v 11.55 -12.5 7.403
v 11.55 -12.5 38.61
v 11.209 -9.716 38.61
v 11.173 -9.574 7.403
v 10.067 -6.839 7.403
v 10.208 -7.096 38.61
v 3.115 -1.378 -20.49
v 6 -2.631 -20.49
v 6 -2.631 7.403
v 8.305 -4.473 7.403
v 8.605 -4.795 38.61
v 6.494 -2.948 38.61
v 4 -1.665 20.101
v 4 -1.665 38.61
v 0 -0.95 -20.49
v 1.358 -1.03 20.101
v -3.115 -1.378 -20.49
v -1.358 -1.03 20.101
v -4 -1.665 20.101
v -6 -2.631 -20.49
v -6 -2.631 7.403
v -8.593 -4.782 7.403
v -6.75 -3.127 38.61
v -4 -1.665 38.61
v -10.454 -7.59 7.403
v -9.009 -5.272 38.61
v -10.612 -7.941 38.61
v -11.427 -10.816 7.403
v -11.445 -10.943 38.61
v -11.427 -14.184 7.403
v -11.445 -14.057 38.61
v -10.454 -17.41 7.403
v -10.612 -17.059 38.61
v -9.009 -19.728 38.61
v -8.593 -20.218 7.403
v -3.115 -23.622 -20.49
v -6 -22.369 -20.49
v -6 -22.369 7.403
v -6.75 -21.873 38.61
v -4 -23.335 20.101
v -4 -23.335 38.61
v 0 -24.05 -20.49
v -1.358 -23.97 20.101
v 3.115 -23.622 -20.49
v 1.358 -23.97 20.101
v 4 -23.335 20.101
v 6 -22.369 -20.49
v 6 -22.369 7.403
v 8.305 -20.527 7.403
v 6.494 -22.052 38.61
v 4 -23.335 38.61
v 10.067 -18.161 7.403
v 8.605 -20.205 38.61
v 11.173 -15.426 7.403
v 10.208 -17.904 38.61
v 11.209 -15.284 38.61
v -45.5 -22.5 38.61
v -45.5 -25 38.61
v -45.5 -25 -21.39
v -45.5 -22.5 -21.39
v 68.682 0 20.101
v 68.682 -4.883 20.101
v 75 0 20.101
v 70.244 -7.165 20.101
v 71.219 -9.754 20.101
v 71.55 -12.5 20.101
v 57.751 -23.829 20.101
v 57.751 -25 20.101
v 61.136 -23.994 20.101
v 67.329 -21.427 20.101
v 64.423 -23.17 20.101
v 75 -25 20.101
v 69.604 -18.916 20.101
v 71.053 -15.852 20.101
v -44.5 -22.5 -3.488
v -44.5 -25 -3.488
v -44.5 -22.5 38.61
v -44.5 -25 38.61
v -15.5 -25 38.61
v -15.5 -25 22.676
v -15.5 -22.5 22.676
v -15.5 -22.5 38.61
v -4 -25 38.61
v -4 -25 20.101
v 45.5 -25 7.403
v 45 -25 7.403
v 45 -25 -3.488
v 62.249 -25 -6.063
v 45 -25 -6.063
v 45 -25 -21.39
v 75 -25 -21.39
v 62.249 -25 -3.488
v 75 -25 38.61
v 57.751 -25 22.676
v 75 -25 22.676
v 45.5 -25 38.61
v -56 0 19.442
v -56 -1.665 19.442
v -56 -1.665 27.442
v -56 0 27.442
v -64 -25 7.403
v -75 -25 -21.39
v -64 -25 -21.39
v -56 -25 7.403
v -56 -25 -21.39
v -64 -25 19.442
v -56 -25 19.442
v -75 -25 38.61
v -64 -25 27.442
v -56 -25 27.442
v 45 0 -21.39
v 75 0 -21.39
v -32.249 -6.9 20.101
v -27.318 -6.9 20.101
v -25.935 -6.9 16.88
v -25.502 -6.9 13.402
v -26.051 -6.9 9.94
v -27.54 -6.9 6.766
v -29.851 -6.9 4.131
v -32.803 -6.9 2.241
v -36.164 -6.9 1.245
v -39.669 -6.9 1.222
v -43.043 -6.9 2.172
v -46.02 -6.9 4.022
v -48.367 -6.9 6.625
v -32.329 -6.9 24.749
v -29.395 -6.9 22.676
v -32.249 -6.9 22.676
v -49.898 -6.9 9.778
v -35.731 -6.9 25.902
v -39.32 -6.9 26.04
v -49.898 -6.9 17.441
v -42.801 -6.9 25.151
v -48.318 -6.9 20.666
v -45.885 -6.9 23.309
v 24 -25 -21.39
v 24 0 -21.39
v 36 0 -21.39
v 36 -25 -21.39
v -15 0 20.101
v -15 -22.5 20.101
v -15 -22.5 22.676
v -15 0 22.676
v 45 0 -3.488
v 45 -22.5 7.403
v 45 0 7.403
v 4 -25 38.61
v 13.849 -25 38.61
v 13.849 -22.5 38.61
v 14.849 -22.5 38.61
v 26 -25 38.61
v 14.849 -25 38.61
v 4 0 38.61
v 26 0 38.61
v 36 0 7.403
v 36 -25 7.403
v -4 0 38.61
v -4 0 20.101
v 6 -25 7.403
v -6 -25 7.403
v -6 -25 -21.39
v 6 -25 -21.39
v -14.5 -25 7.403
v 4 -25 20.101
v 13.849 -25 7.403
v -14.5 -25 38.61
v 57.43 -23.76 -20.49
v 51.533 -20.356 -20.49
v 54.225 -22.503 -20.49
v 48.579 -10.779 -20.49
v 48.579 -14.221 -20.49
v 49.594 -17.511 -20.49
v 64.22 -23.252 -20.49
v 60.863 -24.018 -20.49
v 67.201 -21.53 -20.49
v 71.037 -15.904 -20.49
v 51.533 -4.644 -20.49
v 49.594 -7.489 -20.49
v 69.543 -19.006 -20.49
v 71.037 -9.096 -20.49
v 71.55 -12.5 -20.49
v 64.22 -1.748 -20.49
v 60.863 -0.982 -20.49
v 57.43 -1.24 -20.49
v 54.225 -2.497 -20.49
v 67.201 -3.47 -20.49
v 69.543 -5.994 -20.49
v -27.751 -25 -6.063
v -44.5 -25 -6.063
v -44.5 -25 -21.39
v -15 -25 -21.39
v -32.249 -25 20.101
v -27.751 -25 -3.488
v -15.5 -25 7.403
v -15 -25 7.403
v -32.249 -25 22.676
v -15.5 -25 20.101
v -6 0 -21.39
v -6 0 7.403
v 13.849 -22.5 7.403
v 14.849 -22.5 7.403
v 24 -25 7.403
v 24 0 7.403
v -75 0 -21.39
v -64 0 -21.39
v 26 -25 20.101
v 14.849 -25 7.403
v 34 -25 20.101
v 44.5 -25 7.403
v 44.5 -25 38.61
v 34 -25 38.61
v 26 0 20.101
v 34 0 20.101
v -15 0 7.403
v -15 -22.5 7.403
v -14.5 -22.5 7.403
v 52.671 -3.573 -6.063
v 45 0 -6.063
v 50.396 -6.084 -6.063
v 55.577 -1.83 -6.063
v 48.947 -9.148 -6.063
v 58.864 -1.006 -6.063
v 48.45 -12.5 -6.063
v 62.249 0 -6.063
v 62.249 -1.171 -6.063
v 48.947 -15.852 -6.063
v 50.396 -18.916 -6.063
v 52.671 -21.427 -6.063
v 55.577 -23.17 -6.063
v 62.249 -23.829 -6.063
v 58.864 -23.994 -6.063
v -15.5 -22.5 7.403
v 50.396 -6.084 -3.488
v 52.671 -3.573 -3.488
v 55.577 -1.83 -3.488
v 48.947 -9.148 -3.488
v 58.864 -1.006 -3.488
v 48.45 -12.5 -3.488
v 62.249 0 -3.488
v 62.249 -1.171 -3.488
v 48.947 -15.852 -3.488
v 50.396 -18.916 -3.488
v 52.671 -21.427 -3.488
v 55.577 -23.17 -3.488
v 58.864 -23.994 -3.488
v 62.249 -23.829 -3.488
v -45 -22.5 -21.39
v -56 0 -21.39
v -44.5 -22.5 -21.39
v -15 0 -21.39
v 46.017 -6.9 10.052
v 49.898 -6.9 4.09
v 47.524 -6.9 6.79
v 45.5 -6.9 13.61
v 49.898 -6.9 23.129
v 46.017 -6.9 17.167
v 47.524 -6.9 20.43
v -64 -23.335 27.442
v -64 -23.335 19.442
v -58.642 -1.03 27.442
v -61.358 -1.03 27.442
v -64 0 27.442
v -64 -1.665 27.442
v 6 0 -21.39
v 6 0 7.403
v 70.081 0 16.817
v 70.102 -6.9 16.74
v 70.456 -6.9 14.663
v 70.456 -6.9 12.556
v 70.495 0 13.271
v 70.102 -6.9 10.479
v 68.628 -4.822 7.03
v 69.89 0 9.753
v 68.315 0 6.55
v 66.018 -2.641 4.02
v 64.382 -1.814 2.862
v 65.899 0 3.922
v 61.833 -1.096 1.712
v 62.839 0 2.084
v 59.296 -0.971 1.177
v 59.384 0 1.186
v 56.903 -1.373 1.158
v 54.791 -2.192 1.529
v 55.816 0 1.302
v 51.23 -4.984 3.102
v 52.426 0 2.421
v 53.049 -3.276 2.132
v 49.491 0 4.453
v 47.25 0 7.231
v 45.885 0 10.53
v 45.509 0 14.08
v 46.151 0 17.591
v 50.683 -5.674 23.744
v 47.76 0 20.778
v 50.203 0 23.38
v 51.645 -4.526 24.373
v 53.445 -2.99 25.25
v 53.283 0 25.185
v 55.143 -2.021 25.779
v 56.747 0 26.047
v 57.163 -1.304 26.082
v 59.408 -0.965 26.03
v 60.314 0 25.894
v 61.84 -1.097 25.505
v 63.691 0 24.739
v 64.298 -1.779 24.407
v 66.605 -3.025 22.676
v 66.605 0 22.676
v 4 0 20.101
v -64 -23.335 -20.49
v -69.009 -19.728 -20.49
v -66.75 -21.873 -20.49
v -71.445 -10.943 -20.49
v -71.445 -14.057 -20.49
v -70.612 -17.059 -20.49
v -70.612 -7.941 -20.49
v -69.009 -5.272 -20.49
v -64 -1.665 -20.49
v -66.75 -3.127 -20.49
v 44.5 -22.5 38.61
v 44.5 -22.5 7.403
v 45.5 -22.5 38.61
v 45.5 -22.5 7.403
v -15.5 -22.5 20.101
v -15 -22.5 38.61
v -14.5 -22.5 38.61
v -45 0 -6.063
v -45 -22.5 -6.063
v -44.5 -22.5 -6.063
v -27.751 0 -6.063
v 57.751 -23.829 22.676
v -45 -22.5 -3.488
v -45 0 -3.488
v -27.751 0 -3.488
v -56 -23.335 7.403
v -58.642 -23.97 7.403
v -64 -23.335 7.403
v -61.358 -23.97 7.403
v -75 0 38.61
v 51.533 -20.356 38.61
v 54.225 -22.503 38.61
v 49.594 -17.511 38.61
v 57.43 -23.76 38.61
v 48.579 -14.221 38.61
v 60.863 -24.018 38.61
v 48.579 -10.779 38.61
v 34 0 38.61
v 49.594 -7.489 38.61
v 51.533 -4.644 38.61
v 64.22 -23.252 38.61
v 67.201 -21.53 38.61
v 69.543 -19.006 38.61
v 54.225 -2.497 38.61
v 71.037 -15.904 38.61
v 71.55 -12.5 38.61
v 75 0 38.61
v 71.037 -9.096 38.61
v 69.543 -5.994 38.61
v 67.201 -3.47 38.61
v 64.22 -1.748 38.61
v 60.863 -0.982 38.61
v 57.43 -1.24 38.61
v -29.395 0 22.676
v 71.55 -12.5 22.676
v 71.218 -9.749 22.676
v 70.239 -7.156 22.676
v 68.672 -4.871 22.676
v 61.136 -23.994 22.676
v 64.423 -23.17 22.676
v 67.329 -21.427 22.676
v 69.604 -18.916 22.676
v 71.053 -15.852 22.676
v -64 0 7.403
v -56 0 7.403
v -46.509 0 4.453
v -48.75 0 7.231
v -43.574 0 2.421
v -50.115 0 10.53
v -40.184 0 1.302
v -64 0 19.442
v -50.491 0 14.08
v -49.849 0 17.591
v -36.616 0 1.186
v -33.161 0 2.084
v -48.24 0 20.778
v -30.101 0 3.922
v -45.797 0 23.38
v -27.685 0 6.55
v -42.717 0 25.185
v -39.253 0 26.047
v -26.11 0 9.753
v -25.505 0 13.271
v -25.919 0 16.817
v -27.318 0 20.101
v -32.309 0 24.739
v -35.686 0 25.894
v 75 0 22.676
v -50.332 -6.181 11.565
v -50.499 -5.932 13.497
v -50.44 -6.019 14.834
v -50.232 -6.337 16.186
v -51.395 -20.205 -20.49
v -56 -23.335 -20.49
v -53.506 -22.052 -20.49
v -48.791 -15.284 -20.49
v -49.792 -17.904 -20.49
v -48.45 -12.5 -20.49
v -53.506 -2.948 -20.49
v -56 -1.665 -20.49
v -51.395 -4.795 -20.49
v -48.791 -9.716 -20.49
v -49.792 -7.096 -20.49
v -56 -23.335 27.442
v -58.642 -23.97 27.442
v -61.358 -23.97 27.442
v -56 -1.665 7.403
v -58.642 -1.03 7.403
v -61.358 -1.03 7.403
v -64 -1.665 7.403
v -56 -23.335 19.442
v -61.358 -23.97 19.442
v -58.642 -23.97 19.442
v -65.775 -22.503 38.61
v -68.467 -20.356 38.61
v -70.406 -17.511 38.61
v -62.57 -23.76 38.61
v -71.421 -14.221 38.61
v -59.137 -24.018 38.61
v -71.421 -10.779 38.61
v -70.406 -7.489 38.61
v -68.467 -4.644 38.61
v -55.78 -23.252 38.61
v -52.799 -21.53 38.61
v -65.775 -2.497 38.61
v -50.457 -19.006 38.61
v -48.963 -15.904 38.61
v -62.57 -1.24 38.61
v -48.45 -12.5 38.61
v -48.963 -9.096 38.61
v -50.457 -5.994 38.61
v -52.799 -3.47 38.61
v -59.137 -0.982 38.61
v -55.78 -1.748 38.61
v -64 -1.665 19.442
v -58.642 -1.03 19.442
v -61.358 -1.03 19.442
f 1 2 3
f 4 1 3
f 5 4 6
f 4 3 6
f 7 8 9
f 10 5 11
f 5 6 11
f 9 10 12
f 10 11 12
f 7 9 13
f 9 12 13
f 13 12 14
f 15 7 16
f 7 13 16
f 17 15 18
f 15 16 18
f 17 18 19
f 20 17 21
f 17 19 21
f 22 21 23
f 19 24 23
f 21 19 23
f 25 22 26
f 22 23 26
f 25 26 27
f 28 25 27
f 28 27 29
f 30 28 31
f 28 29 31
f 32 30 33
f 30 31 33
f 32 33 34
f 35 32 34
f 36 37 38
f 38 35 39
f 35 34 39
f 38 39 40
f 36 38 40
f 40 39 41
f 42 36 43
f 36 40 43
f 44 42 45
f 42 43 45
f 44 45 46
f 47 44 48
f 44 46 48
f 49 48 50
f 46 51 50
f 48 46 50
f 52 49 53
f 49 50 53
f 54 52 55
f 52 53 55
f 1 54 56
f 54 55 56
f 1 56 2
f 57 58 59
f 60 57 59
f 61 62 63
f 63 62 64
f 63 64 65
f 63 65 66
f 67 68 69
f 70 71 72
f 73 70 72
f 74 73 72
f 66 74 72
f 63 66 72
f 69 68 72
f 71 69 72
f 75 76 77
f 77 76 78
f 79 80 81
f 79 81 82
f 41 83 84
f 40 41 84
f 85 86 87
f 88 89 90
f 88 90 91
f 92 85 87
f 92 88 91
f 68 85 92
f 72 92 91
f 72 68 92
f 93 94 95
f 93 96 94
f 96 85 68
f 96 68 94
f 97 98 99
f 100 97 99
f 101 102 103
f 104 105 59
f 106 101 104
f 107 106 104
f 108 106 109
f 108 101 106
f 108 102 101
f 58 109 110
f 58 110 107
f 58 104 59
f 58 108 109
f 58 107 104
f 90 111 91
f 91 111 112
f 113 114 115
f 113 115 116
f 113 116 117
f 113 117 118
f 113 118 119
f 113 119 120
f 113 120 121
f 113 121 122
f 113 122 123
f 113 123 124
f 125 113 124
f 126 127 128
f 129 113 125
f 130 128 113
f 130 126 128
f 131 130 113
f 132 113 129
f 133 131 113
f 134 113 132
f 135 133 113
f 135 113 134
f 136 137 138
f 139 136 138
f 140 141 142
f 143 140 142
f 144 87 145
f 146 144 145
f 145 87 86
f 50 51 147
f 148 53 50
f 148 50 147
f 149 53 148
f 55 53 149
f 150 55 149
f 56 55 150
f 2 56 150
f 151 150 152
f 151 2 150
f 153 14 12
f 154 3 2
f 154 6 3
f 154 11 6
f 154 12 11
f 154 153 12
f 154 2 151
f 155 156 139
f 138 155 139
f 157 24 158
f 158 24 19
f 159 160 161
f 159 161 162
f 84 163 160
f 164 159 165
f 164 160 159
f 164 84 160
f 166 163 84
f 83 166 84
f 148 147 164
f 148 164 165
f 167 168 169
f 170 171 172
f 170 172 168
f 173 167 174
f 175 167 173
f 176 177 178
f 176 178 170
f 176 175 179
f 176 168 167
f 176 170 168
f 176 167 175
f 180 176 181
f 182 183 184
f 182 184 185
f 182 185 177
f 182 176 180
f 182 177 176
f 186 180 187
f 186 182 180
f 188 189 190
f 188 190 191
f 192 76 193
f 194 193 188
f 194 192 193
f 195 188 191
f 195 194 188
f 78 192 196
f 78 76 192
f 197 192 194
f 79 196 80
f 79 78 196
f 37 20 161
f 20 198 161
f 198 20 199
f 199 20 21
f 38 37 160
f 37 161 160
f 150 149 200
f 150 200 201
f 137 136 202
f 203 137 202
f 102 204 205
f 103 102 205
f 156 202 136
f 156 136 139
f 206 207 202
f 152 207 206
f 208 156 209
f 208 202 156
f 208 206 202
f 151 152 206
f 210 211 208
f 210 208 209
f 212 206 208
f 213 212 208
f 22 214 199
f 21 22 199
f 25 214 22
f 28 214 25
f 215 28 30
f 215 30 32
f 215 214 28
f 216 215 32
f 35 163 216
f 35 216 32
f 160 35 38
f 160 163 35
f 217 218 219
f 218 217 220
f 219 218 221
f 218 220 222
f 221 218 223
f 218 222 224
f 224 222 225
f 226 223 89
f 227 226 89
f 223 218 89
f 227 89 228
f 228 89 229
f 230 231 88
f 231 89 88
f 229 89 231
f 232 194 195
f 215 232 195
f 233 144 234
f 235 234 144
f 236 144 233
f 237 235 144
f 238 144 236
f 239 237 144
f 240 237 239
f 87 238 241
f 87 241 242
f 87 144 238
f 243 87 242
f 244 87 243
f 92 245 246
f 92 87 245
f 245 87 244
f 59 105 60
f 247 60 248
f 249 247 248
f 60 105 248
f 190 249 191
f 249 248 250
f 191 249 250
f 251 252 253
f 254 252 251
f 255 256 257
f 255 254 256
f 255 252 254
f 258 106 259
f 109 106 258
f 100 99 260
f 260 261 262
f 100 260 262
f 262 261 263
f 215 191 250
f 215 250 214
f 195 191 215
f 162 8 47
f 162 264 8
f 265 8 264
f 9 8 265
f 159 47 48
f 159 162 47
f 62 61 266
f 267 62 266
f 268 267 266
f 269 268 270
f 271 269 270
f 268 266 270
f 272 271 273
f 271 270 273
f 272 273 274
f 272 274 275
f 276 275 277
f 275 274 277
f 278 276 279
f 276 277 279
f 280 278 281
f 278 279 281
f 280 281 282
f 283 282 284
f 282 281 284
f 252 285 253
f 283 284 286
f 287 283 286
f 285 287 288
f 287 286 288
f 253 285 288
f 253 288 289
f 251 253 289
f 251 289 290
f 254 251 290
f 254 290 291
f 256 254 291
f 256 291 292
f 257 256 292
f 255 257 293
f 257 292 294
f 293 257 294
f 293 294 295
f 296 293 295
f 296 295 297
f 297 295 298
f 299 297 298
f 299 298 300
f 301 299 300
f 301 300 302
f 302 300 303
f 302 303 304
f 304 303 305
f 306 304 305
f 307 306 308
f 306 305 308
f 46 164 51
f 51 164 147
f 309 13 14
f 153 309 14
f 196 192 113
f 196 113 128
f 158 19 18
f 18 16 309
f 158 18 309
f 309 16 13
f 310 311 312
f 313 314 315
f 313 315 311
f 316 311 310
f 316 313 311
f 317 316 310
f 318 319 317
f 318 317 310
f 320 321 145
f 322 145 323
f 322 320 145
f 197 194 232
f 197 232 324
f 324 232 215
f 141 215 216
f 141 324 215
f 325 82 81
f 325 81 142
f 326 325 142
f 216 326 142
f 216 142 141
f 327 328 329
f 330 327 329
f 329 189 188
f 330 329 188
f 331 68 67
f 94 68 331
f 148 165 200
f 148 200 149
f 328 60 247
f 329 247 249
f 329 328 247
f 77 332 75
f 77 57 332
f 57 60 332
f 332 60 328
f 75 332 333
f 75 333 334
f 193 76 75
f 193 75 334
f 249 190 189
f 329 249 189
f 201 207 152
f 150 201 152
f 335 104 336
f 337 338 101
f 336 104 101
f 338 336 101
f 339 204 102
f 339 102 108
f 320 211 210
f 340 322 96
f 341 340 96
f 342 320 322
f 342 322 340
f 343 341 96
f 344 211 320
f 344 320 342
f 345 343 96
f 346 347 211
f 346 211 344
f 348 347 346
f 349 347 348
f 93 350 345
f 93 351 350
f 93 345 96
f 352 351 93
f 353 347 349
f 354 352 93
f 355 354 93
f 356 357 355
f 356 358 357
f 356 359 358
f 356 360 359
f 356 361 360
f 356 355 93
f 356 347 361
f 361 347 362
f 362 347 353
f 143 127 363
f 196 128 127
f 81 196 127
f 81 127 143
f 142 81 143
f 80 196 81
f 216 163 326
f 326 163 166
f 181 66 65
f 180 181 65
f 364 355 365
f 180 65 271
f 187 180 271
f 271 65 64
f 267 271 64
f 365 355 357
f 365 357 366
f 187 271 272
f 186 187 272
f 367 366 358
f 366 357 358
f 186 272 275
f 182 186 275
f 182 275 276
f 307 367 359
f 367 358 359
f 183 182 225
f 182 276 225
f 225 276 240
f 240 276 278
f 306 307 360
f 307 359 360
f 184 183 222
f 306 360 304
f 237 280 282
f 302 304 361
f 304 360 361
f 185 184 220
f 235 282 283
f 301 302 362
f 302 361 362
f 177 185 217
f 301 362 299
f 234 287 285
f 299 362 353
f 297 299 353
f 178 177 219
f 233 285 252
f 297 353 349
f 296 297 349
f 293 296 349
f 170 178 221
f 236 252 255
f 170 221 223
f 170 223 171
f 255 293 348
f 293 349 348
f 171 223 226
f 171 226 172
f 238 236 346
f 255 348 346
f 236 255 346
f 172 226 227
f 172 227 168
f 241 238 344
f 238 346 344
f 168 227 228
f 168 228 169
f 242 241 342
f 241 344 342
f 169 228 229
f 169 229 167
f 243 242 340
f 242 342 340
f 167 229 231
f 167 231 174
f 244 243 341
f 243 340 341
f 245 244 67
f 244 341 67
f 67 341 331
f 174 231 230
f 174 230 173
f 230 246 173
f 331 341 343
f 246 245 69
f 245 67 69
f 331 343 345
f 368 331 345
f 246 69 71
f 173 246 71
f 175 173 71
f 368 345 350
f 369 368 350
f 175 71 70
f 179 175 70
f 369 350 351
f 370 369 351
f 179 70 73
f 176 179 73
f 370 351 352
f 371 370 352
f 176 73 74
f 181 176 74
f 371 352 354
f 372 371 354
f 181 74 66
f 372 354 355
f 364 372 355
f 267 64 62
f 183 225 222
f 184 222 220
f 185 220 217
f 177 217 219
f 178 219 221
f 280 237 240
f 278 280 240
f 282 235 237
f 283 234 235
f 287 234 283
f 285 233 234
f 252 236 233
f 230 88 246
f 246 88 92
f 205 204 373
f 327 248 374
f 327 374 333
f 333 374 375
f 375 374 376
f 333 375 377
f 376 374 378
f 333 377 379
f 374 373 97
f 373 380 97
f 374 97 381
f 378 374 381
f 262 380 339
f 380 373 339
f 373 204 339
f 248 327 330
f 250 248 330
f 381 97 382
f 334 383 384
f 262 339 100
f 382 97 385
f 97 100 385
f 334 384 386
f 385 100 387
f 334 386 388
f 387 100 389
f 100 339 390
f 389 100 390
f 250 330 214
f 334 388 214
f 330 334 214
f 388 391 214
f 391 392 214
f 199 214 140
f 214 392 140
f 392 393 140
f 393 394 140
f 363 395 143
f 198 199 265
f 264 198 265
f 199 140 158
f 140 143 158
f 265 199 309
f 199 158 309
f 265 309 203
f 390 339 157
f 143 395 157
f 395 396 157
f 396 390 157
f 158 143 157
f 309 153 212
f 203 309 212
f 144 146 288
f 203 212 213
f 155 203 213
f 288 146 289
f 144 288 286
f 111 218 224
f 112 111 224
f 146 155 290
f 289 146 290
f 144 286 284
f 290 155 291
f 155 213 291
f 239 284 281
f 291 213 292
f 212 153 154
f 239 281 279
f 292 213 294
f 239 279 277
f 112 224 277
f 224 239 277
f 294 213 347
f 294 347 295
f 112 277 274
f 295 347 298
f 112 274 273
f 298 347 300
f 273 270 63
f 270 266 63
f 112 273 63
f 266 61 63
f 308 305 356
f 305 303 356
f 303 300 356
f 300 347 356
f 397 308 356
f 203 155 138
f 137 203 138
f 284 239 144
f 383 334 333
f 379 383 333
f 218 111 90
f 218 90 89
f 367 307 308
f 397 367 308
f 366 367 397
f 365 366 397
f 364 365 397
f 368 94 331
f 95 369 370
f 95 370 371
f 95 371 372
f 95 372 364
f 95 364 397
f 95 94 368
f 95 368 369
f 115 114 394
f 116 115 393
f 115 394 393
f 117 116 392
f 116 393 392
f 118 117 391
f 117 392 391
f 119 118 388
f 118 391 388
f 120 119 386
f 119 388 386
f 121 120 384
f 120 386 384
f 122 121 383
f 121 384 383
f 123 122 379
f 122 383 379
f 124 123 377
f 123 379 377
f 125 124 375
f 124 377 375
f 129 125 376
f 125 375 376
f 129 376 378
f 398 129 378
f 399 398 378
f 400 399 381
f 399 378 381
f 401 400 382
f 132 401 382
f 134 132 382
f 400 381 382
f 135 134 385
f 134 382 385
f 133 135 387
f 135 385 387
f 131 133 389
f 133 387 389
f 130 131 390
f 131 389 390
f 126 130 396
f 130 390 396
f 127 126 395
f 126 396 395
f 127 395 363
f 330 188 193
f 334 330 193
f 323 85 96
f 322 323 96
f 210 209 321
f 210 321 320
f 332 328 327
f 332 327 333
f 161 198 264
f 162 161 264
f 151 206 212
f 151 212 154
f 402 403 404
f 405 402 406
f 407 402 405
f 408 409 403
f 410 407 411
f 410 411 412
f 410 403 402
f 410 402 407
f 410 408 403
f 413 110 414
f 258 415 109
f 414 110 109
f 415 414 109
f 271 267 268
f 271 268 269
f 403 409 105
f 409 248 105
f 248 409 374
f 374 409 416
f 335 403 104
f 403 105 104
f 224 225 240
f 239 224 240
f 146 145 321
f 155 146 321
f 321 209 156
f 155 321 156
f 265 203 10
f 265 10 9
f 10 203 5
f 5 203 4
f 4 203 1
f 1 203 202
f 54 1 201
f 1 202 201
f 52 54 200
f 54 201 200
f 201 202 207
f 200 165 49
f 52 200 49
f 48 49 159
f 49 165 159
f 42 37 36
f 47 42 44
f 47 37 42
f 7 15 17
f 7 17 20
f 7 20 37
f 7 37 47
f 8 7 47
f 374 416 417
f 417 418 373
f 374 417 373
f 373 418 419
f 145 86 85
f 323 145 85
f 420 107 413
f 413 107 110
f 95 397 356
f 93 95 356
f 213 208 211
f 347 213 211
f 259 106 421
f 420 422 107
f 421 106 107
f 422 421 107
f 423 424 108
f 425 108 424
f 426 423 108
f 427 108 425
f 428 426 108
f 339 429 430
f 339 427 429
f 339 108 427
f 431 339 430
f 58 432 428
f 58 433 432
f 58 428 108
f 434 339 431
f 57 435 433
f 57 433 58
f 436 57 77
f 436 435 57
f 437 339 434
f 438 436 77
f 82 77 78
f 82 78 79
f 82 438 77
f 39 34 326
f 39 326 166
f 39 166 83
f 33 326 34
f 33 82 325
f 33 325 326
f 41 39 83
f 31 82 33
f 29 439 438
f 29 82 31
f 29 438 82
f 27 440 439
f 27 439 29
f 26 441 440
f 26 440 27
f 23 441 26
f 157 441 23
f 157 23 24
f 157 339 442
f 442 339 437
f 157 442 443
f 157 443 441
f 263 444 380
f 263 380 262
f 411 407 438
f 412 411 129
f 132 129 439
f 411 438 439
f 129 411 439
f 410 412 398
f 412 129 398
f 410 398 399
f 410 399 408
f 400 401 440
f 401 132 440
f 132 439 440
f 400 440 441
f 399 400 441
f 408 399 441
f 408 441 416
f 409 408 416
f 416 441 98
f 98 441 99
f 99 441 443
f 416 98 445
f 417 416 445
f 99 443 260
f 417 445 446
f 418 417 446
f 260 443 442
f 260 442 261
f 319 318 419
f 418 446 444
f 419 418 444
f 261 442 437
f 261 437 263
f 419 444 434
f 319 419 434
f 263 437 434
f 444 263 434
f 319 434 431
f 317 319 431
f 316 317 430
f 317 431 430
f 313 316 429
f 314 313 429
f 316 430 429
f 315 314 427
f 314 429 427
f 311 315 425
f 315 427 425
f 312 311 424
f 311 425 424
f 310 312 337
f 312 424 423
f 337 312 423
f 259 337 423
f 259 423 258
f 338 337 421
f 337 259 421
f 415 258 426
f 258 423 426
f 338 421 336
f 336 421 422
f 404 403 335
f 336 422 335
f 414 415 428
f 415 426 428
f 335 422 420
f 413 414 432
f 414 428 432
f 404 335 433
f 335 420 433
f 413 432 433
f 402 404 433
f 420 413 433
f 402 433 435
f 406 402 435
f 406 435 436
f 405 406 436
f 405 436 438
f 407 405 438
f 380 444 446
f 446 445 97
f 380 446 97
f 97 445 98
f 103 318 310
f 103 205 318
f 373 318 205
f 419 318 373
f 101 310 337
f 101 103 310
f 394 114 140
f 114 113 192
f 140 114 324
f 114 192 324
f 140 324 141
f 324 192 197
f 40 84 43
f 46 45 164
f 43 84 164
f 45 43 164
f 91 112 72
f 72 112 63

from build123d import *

# Parameters (mm, degrees)
F0_W      = 150
F0_H      = 60
F1_DEPTH  = 25
F2_W      = 146
F2_H      = 21
F3_DEPTH  = 2
F4_R      = 11.55
F5_DEPTH  = 59.1
F6_R      = 12.5
F7_DEPTH  = 6.9
F8_W      = 4
F8_H      = 8
F8_H_2    = 28.7938314093
F8_W_2    = 17.2490148246
F8_H_3    = 2.5750142522
F8_W_3    = 9
F8_H_4    = 18.5084169569
F9_DEPTH  = 35.6
F10_W     = 8
F10_H     = 28.7938314093
F10_H_2   = 18.5084169569
F10_H_3   = 8
F10_W_2   = 0.5
F10_H_4   = 15.327197553
F10_W_3   = 16.7490148246
F10_H_5   = 2.5750142522
F10_H_6   = 31.2061685907
F10_H_7   = 15.9334027047
F10_H_8   = 12.6977516338
F10_H_9   = 42.0977881948
F11_DEPTH = 2.5


with BuildPart() as f1:
    # F0 (on Front) → F1 (new body)
    with BuildSketch(Plane.XZ):
        with Locations((0, 8.6096065703)):
            Rectangle(F0_W, F0_H)
    extrude(amount=F1_DEPTH)

    # F2 (on face) → F3 (join)
    with BuildSketch(Plane.XY.offset(38.6096065703)):
        with Locations((0, -12.5)):
            Rectangle(F2_W, F2_H)
    extrude(amount=-F3_DEPTH)

    # F4 (on face) → F5 (cut)
    with BuildSketch(Plane.XY.offset(38.6096065703)):
        with Locations((60, -12.5)):
            Circle(F4_R)
        with Locations((-60, -12.5)):
            Circle(F4_R)
        with Locations((0, -12.5)):
            Circle(F4_R)
    extrude(amount=-F5_DEPTH, mode=Mode.SUBTRACT)

    # F6 (on face) → F7 (cut)
    with BuildSketch(Plane(origin=(0, 0, 0), x_dir=(-1, 0, 0), z_dir=(0, 1, 0))):
        with Locations((-58, 13.6096065703)):
            Circle(F6_R)
        with Locations((38, 13.6096065703)):
            Circle(F6_R)
    extrude(amount=-F7_DEPTH, mode=Mode.SUBTRACT)

    # F8 (on face) → F9 (cut)
    with BuildSketch(Plane.XZ.offset(25)):
        with Locations((-62, 23.4421596825)):
            Rectangle(F8_W, F8_H)
        with Locations((-58, 23.4421596825)):
            Rectangle(F8_W, F8_H)
        with Locations((-62, -6.9934777251)):
            Rectangle(F8_W, F8_H_2)
        with Locations((-58, -6.9934777251)):
            Rectangle(F8_W, F8_H_2)
        with Locations((-36.3754925877, -4.7756887507)):
            Rectangle(F8_W_2, F8_H_3)
        with Locations((-23.6245074123, 21.3886967395)):
            Rectangle(F8_W_2, F8_H_3)
        Polygon((4, 38.6096065703), (-4, 38.6096065703), (-4, 20.1011896133), (0, 20.1011896133), (4, 20.1011896133), align=None)
        with Locations((-10.5, -6.9934777251)):
            Rectangle(F8_W_3, F8_H_2)
        with Locations((10.5, -6.9934777251)):
            Rectangle(F8_W_3, F8_H_2)
        with Locations((19.5, -6.9934777251)):
            Rectangle(F8_W_3, F8_H_2)
        with Locations((32, 29.3553980918)):
            Rectangle(F8_W, F8_H_4)
        with Locations((28, 29.3553980918)):
            Rectangle(F8_W, F8_H_4)
        Polygon((36, 7.4034379795), (36, -21.3903934297), (45, -21.3903934297), (45, -6.0631958768), (45, -3.4881816246), (45, 7.4034379795), align=None)
        with Locations((53.6245074123, -4.7756887507)):
            Rectangle(F8_W_2, F8_H_3)
        with Locations((66.3754925877, 21.3886967395)):
            Rectangle(F8_W_2, F8_H_3)
    extrude(amount=-F9_DEPTH, mode=Mode.SUBTRACT)

    # F10 (on face) → F11 (cut)
    with BuildSketch(Plane.XZ.offset(25)):
        with Locations((-60, -6.9934777251)):
            Rectangle(F10_W, F10_H)
        with Locations((0, 29.3553980918)):
            Rectangle(F10_W, F10_H_2)
        with Locations((30, 29.3553980918)):
            Rectangle(F10_W, F10_H_2)
        with Locations((-60, 23.4421596825)):
            Rectangle(F10_W, F10_H_3)
        with Locations((-44.75, -13.7267946533)):
            Rectangle(F10_W_2, F10_H_4)
        with Locations((-36.1254925877, -4.7756887507)):
            Rectangle(F10_W_3, F10_H_5)
        with Locations((-23.8745074123, 21.3886967395)):
            Rectangle(F10_W_3, F10_H_5)
        Polygon((-15, 7.4034379795), (-15, -21.3903934297), (-6, -21.3903934297), (-6, 7.4034379795), (-14.5, 7.4034379795), align=None)
        Polygon((6, 7.4034379795), (6, -21.3903934297), (14.3485692441, -21.3903934297), (14.3485692441, 7.4034379795), (13.8485692441, 7.4034379795), align=None)
        Polygon((14.3485692441, 7.4034379795), (14.3485692441, -21.3903934297), (24, -21.3903934297), (24, 7.4034379795), (14.8485692441, 7.4034379795), align=None)
        with Locations((-44.75, -4.7756887507)):
            Rectangle(F10_W_2, F10_H_5)
        Polygon((36, 7.4034379795), (36, -21.3903934297), (45, -21.3903934297), (45, -6.0631958768), (45, -3.4881816246), (45, 7.4034379795), (44.5, 7.4034379795), align=None)
        with Locations((45.25, 23.0065222749)):
            Rectangle(F10_W_2, F10_H_6)
        with Locations((44.75, 23.0065222749)):
            Rectangle(F10_W_2, F10_H_6)
        with Locations((14.5985692441, 23.0065222749)):
            Rectangle(F10_W_2, F10_H_6)
        with Locations((14.0985692441, 23.0065222749)):
            Rectangle(F10_W_2, F10_H_6)
        Polygon((-14.5, 38.6096065703), (-15, 38.6096065703), (-15, 22.6762038656), (-15, 20.1011896133), (-15, 7.4034379795), (-14.5, 7.4034379795), align=None)
        with Locations((-15.25, 30.6429052179)):
            Rectangle(F10_W_2, F10_H_7)
        with Locations((-15.25, 13.7523137964)):
            Rectangle(F10_W_2, F10_H_8)
        with Locations((-15.25, 21.3886967395)):
            Rectangle(F10_W_2, F10_H_5)
        with Locations((-44.75, 17.5607124729)):
            Rectangle(F10_W_2, F10_H_9)
        Polygon((-45, 38.6096065703), (-45.5, 38.6096065703), (-45.5, -21.3903934297), (-45, -21.3903934297), (-45, -6.0631958768), (-45, -3.4881816246), align=None)
    extrude(amount=-F11_DEPTH, mode=Mode.SUBTRACT)


solid = f1.part
